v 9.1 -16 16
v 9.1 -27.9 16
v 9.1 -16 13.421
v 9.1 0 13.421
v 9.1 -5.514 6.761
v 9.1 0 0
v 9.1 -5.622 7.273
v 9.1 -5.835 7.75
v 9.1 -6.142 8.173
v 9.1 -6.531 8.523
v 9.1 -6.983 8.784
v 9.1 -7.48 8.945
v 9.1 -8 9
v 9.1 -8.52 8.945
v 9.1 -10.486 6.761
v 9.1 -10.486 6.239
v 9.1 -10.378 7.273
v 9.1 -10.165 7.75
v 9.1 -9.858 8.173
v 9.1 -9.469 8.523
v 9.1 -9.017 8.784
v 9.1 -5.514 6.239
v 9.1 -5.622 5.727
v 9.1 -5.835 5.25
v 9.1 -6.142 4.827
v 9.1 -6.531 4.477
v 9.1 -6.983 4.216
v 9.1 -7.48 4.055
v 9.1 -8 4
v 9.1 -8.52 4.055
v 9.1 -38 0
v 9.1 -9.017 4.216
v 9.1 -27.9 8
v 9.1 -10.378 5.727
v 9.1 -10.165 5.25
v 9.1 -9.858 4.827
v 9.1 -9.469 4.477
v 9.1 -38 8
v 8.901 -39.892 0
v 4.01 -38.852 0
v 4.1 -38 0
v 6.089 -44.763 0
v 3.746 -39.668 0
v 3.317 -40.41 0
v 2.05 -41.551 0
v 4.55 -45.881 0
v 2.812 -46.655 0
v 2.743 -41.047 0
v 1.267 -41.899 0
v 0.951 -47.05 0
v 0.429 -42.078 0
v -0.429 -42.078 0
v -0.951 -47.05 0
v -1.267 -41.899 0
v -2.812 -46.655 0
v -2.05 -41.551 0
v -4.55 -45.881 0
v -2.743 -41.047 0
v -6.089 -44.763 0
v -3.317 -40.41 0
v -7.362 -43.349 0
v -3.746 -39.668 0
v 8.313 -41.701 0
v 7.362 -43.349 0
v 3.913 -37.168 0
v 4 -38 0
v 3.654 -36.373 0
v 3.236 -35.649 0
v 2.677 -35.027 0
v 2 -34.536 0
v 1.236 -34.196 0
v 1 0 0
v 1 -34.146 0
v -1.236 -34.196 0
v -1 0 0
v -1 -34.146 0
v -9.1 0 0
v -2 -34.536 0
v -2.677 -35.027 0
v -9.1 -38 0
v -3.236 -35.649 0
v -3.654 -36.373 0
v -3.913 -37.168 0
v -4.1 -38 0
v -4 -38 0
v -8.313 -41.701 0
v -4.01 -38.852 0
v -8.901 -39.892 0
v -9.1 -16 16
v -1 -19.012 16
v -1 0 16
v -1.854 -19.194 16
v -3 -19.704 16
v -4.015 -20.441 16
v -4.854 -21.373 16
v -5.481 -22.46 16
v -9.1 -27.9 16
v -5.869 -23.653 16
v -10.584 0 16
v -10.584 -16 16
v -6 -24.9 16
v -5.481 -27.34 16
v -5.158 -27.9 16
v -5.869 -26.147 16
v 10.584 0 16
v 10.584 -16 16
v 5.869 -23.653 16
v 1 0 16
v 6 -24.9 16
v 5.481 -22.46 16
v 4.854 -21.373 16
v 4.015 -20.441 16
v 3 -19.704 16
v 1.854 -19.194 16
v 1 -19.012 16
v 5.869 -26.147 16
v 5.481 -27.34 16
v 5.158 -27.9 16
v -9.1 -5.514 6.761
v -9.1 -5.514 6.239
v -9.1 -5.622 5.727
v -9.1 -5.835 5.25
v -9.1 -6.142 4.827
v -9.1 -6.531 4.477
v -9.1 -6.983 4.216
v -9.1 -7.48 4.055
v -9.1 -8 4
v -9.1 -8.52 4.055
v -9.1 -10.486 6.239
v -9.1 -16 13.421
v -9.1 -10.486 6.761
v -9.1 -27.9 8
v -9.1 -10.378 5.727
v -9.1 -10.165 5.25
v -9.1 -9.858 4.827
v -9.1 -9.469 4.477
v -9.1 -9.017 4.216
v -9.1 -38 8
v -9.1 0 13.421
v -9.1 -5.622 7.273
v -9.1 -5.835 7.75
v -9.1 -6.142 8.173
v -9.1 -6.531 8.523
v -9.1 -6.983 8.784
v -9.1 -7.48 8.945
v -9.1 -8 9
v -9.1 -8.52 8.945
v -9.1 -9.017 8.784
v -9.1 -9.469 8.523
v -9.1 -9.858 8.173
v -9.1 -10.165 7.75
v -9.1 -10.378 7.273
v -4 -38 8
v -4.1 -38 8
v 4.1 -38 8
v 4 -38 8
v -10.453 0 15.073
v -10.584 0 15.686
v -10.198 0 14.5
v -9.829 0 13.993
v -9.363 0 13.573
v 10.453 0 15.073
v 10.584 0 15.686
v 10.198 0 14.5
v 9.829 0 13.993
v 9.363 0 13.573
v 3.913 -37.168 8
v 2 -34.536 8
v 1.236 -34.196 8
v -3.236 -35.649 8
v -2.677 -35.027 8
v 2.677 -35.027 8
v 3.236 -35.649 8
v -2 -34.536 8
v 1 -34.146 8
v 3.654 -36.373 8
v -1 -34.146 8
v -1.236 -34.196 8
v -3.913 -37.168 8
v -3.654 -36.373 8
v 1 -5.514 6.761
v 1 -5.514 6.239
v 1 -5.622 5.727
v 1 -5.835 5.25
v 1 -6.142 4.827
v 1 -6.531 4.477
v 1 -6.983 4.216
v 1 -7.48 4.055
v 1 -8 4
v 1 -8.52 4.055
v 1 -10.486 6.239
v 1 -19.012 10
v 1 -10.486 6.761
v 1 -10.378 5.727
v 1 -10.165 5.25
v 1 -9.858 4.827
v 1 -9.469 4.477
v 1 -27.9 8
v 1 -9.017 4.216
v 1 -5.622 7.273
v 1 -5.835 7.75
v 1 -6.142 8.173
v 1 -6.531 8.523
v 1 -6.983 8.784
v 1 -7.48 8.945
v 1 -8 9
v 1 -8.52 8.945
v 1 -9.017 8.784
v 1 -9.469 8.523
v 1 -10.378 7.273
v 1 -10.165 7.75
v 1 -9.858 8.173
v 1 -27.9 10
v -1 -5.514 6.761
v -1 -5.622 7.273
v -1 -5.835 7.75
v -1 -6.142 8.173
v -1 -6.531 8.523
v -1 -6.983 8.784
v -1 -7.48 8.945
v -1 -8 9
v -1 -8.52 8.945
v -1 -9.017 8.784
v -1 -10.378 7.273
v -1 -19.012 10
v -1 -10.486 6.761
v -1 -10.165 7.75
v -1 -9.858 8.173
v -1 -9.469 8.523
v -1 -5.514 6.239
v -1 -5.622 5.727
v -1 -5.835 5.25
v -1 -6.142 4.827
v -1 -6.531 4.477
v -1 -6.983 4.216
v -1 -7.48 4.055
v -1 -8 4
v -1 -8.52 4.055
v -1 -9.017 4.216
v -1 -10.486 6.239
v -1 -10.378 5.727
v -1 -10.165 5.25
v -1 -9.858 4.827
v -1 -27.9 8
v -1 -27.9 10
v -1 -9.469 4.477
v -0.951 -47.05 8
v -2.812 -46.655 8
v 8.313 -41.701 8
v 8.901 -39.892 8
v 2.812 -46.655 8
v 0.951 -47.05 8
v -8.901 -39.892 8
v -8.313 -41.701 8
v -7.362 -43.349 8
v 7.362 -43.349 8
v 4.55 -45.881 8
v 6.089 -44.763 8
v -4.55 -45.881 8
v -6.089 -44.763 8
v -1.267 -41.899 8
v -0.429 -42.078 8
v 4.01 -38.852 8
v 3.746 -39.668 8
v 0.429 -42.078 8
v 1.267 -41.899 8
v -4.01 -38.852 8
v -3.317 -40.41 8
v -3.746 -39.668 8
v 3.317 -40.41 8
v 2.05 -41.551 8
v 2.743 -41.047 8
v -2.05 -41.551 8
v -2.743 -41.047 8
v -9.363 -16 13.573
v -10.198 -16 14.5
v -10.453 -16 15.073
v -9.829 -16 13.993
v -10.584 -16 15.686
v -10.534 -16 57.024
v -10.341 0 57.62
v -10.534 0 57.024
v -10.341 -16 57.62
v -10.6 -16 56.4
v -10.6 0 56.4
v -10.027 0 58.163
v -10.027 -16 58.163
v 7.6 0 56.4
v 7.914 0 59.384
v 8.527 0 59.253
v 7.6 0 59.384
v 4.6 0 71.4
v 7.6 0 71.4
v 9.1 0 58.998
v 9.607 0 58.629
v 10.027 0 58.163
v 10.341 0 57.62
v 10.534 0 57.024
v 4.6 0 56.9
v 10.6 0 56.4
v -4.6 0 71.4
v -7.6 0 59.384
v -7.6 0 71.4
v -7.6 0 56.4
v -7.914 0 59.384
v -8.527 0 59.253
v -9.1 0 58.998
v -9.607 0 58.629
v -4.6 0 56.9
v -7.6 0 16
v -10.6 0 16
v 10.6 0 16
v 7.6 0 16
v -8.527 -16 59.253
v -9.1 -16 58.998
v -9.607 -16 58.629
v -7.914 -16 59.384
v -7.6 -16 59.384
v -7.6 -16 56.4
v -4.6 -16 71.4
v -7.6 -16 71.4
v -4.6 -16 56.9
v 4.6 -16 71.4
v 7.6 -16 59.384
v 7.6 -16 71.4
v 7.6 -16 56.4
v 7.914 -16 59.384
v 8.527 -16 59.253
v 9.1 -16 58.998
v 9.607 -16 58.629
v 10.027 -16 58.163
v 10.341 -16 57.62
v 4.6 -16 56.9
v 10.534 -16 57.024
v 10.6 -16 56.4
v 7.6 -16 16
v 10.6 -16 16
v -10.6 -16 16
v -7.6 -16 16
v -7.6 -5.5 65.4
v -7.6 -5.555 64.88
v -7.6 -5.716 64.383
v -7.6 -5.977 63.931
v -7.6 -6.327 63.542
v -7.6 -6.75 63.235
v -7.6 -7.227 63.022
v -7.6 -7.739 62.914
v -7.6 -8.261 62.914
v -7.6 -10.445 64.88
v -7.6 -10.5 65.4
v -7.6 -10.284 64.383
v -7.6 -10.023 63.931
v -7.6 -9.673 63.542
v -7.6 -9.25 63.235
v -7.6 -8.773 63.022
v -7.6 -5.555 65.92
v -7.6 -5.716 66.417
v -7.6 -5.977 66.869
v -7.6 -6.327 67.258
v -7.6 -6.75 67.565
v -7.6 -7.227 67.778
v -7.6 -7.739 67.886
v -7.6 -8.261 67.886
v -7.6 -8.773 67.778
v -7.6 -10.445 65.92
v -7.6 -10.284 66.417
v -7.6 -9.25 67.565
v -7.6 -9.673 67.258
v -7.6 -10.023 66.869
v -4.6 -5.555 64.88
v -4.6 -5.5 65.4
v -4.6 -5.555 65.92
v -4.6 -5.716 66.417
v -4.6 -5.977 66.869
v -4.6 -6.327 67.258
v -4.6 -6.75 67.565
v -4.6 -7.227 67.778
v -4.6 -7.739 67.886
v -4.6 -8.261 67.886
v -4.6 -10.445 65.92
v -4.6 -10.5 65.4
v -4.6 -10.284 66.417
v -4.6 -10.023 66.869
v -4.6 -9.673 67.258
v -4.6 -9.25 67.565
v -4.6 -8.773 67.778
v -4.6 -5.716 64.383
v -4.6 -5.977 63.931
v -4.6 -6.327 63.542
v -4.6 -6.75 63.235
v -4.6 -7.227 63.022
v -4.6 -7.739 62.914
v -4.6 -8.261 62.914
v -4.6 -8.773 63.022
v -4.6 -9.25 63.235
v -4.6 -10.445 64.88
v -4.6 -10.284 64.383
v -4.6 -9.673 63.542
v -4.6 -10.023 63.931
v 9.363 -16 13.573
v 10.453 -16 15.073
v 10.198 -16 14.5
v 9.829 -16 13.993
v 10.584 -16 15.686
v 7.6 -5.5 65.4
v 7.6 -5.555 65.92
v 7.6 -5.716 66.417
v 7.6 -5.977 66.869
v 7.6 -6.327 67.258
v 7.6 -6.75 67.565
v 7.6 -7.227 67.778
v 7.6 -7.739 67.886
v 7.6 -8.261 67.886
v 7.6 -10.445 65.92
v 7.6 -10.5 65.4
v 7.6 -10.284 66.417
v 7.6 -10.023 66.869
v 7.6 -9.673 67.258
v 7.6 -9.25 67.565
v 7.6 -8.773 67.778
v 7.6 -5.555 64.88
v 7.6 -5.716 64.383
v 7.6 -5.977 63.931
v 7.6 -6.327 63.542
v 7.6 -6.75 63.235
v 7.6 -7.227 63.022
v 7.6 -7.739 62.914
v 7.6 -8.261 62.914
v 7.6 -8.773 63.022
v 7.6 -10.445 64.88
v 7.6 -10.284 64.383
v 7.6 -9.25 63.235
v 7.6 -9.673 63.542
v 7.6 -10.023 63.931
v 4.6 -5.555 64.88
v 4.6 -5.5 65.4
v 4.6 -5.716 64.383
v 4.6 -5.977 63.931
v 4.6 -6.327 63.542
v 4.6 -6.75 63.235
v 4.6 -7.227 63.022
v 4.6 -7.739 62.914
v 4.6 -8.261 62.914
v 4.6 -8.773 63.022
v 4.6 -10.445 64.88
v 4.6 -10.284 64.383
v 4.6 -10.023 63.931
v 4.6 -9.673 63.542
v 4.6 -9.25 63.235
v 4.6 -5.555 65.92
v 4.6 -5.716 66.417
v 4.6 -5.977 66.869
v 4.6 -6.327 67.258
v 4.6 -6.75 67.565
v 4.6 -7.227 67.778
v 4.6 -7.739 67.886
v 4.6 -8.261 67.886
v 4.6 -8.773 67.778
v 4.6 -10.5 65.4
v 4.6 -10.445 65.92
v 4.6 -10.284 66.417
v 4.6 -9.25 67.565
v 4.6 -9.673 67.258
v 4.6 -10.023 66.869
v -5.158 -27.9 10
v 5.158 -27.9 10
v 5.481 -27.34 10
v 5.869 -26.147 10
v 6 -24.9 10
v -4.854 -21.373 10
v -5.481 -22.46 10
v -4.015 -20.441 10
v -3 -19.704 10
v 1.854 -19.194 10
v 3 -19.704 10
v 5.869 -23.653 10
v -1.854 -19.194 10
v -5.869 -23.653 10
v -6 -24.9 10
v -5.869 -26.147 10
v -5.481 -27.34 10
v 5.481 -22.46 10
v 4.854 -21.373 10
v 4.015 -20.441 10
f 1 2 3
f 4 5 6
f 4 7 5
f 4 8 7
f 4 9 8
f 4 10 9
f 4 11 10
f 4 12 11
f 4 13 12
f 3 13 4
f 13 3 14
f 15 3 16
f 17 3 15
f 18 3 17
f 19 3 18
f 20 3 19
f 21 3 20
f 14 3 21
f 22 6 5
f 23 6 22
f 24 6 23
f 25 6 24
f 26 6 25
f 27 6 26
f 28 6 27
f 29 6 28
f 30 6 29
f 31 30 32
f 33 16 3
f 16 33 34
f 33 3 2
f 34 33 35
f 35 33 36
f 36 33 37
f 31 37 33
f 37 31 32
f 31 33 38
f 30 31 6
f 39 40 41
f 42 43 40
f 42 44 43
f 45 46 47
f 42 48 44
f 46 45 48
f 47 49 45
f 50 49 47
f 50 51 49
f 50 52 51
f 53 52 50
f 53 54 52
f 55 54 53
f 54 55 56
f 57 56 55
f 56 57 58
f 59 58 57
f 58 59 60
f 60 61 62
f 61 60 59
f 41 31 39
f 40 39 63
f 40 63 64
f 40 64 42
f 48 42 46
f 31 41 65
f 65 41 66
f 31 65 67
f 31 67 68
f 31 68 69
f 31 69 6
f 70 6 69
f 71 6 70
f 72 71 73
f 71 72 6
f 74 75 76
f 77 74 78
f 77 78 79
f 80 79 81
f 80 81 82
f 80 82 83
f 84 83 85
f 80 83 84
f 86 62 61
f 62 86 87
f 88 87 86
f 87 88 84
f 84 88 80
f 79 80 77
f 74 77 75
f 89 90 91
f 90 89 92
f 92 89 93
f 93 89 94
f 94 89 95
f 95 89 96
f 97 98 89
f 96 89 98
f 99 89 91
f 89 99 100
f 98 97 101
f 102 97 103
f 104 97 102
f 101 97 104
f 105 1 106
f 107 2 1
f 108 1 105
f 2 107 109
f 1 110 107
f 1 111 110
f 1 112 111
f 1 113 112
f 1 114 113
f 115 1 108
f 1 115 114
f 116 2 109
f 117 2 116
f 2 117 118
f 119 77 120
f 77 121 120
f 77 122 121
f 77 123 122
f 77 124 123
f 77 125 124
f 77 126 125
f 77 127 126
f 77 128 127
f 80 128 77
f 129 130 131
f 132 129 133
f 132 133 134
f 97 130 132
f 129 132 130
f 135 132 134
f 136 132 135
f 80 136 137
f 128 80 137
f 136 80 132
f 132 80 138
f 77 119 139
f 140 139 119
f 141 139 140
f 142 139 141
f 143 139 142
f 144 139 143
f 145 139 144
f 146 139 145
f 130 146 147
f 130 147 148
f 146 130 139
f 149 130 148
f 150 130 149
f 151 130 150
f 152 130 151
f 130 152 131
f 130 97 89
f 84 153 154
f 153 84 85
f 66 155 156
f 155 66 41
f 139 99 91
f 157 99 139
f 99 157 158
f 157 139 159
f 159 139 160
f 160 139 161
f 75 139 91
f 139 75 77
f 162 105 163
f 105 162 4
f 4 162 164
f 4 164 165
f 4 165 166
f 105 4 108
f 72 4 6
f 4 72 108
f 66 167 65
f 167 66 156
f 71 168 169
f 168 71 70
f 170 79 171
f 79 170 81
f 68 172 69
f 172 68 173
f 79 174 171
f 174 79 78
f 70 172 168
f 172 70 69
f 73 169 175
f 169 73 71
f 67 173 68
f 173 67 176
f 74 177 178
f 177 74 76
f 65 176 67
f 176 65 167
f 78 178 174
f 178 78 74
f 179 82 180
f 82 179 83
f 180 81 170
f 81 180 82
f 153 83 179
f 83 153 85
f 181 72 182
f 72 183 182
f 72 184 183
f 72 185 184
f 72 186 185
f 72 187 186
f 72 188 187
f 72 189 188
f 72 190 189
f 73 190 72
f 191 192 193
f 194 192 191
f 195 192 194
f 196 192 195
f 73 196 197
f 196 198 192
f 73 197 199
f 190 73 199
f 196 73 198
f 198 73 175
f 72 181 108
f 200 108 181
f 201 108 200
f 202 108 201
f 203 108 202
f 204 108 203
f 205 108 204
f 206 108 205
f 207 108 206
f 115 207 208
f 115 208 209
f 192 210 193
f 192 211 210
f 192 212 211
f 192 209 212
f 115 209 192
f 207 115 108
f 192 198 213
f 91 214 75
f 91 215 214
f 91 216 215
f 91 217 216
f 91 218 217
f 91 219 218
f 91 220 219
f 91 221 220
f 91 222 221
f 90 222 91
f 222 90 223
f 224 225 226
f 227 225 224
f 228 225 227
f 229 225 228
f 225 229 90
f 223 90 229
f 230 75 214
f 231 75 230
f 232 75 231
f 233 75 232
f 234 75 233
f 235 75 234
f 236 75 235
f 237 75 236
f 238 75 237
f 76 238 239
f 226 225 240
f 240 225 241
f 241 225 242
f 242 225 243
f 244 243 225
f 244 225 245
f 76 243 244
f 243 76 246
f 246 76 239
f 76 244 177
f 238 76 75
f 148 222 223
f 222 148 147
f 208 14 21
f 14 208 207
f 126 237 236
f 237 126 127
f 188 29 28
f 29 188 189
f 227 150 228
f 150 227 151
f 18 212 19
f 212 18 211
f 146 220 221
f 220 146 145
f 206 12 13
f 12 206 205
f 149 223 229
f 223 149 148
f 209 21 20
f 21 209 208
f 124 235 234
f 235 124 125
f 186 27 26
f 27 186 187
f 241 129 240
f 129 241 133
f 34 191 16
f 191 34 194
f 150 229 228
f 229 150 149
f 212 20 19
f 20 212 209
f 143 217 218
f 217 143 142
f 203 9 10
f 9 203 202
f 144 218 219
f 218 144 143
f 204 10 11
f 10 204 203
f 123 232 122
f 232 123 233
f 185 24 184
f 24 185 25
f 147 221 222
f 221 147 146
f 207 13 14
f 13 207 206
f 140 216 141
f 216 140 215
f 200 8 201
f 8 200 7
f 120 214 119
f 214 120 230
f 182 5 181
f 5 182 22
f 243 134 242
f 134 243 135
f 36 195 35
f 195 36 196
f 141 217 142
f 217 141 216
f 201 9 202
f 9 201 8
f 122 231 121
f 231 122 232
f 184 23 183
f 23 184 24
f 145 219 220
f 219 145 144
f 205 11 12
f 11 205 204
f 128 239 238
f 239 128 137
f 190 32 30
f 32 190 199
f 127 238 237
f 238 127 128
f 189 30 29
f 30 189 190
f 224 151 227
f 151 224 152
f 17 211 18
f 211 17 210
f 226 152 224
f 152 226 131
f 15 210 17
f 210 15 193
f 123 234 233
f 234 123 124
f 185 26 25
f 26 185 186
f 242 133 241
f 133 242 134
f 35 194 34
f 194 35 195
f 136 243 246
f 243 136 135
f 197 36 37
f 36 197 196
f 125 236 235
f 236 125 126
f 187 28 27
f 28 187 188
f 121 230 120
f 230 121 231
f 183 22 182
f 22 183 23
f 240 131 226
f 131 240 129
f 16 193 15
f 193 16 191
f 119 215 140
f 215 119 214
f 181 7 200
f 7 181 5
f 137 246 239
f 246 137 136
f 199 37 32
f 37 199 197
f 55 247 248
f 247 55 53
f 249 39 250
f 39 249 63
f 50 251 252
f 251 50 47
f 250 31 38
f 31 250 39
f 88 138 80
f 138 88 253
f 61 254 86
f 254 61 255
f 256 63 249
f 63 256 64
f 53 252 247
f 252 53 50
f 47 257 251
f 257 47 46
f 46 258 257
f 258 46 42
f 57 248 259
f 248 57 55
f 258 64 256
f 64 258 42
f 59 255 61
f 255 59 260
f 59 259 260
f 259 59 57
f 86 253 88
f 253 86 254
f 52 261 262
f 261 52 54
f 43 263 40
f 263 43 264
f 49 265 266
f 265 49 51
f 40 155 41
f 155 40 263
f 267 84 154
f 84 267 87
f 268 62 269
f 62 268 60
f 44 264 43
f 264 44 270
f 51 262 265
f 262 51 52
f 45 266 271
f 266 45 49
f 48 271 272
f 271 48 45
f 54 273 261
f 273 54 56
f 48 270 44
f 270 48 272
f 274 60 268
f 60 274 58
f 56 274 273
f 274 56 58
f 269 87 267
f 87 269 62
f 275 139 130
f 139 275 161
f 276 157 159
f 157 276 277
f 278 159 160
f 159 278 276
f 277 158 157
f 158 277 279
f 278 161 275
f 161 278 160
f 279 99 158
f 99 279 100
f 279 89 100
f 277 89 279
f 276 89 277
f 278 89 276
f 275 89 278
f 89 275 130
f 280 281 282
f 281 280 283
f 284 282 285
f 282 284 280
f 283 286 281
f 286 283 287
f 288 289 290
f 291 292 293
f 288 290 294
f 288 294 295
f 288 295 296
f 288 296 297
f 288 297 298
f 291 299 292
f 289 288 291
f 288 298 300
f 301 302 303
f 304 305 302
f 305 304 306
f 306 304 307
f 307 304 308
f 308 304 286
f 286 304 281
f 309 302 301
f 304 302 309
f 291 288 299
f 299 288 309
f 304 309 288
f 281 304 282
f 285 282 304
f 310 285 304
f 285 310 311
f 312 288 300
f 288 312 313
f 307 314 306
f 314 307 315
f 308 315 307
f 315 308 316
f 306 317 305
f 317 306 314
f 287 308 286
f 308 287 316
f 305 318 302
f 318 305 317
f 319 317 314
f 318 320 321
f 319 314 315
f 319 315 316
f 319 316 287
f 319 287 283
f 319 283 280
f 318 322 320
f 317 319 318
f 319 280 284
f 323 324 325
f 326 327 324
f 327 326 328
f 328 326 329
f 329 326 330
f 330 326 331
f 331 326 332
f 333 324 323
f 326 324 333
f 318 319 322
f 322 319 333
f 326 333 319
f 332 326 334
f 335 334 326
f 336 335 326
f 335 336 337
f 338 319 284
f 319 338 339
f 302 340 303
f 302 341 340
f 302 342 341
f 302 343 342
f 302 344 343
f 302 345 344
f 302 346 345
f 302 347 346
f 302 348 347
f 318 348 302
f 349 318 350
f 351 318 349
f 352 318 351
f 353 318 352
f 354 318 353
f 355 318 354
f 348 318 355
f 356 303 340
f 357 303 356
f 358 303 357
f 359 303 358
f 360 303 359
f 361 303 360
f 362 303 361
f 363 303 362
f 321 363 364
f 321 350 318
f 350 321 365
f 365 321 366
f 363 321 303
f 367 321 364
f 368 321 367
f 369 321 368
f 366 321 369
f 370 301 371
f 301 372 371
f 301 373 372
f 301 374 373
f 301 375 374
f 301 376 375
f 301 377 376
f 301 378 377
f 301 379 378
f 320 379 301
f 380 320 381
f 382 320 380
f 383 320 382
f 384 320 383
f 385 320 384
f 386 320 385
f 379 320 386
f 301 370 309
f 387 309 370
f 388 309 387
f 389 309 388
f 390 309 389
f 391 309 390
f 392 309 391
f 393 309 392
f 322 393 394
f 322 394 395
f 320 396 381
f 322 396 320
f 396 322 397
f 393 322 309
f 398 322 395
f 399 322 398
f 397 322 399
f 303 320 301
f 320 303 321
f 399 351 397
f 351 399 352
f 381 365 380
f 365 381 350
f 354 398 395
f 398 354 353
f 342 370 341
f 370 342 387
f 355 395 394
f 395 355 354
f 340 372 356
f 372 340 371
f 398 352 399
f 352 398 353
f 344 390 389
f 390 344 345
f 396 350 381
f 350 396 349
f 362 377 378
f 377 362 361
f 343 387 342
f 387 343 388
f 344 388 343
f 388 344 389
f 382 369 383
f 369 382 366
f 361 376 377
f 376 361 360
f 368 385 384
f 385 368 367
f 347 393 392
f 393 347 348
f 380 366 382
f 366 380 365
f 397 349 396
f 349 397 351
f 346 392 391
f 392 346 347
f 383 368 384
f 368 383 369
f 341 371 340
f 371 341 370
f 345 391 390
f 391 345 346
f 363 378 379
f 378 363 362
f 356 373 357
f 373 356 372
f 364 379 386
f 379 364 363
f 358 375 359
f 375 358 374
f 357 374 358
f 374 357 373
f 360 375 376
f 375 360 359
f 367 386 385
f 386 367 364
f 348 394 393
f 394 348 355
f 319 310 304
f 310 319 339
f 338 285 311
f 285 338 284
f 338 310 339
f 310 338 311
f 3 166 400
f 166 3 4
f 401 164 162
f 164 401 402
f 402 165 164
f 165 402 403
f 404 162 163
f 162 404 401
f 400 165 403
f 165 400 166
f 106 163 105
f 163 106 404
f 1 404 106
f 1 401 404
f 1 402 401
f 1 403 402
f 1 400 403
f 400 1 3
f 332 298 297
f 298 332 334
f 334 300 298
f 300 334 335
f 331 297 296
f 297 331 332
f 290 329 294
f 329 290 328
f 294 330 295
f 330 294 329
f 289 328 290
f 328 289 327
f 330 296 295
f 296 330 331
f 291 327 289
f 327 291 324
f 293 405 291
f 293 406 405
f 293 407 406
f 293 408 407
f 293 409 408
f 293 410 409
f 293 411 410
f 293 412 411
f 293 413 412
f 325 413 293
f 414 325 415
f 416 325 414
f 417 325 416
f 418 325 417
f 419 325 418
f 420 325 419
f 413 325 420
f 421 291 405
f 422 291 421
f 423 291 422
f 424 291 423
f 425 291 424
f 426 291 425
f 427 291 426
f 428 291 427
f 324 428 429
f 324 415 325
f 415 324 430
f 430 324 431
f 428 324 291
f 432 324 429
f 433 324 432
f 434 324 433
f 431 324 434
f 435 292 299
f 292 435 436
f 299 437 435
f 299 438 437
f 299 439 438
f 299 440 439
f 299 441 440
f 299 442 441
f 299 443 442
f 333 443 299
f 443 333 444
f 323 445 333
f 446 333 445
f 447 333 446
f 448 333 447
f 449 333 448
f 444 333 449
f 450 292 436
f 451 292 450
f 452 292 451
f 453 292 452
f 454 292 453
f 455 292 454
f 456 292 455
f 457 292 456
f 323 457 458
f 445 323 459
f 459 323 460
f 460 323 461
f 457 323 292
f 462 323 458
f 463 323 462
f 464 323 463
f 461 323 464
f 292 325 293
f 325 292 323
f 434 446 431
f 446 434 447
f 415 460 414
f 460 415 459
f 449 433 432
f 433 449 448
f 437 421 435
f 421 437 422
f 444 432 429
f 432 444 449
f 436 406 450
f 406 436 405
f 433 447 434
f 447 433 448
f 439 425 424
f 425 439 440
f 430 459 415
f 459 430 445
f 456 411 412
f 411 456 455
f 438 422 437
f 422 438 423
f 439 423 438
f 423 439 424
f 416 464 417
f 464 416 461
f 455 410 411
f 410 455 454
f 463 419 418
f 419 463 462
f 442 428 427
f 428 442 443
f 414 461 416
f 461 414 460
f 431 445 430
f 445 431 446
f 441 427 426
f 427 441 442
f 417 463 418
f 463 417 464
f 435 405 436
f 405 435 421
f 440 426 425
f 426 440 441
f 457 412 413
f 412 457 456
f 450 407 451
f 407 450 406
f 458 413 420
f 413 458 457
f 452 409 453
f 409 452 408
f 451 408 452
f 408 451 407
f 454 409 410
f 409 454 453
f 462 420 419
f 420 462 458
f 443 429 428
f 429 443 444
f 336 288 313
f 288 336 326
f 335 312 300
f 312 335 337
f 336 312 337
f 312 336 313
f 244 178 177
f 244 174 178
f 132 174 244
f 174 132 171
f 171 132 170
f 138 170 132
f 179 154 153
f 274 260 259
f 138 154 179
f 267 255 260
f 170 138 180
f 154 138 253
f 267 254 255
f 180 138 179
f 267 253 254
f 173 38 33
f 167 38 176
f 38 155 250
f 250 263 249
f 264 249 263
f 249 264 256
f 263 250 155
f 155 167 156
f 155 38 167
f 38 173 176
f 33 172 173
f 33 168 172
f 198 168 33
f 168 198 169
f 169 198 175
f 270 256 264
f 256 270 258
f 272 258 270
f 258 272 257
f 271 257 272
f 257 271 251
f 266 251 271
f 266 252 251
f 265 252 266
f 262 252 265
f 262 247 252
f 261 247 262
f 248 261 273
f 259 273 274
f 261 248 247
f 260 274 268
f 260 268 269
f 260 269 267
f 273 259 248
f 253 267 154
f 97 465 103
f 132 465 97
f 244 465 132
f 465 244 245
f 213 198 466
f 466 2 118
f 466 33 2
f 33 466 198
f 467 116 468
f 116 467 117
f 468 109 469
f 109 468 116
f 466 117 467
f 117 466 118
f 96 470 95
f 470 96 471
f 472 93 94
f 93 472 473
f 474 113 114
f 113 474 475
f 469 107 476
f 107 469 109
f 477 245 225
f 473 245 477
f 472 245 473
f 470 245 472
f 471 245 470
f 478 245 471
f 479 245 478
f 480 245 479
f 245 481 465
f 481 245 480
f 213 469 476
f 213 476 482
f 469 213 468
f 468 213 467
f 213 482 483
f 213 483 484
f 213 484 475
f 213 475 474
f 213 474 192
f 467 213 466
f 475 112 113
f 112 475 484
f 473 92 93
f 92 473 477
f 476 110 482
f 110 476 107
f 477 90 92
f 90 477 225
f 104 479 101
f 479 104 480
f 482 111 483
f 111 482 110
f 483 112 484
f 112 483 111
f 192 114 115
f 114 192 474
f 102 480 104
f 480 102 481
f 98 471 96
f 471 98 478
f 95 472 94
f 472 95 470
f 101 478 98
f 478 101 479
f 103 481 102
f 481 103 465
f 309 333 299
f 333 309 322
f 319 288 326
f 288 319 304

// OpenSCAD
// file: config.scad
/**
 * Глобальный конфигурационный файл
 */
// качество цилиндров
$fn=30;

// избегание совпадения граней
DELTA=0.1;

// толщина рамы
FRAME=15;
// main file
include <config.scad>

// верхняя деталь
// диаметр отверстия
d1=4.1;
// наружный диаметр
d2=9.1;
// длина
x1=2*d2;
// ширина
y1=38;
// высота
z1=16;
// ширина щели
x11=2;
// диаметр поперечного отверстия
d3=5;

// боковая деталь - стенка
// длина (толщина)
x2=3;
// ширина
y2=40.4;
// высота
z2=16;
// расстояние от центра
x3=FRAME/2+0.1+x2;
// ширина хвостовой части
y3=15;

module hpart_top() {
// кубическая часть вверху
difference() {
    cube([x1,y1,z1]);
    translate([x1/2,y1,DELTA])cylinder(r=4, h=z1);
    translate([(x1-x11)/2,-DELTA,-DELTA])cube([x11,y1,z1+2*DELTA]);
    translate([-DELTA,z2/2,(z1+x2)/2])rotate([0,90,0])cylinder(r=d3/2, h=d2*2+DELTA*2);
}

// круглая часть вверху
difference() {
    translate([x1/2,y1,0])cylinder(r=d2, h=z1);
    translate([x1/2,y1,DELTA])cylinder(r=d1, h=z1);
    translate([(x1-x11)/2,0,DELTA])cube([x11,y1,z1]);
}
}

module quarter() {
intersection() {
    cylinder(r=x2, h=z2);
    cube([x2,x2,z2]);
}
}

module hpart_bottom() {
    translate([-x3,0,0])cube([x2,y2,z2]);
    translate([-x3+x2,y2,0])rotate([0,0,90])quarter();
    translate([-x3+x2,0,0])rotate([0,0,180])quarter();
    translate([-x3+x2,-y3,0])difference() {
        cube([x2,y3,z2]);
        translate([-DELTA,(y3-x2)/2,z2/2])rotate([0,90,0])cylinder(r=d3/2, h=x3);
    }
}

module holder_part03_base() {
    difference() {
        union() {
            translate([-d2,0,0])hpart_top();
            rotate([90,0,0])translate([0,-y2,-z2]){
                hpart_bottom();
                mirror([1,0,0]) hpart_bottom();
            }
        }
        translate([-d2-0.5,y1-d2-1,-0.1])cube([2*d2+1,2*d2+1,8+0.1]);
        translate([0,y1-d2-4,-0.1])cylinder(r=6, h=6+0.1);
    }
}

module holder_part03() {
    translate([0,0,z1])rotate([180,0,0])holder_part03_base();
    translate([-x3+x2,-z2,y2+z1])cube([(x3-x2)*2,z2,0.5]);
}
    
holder_part03();
